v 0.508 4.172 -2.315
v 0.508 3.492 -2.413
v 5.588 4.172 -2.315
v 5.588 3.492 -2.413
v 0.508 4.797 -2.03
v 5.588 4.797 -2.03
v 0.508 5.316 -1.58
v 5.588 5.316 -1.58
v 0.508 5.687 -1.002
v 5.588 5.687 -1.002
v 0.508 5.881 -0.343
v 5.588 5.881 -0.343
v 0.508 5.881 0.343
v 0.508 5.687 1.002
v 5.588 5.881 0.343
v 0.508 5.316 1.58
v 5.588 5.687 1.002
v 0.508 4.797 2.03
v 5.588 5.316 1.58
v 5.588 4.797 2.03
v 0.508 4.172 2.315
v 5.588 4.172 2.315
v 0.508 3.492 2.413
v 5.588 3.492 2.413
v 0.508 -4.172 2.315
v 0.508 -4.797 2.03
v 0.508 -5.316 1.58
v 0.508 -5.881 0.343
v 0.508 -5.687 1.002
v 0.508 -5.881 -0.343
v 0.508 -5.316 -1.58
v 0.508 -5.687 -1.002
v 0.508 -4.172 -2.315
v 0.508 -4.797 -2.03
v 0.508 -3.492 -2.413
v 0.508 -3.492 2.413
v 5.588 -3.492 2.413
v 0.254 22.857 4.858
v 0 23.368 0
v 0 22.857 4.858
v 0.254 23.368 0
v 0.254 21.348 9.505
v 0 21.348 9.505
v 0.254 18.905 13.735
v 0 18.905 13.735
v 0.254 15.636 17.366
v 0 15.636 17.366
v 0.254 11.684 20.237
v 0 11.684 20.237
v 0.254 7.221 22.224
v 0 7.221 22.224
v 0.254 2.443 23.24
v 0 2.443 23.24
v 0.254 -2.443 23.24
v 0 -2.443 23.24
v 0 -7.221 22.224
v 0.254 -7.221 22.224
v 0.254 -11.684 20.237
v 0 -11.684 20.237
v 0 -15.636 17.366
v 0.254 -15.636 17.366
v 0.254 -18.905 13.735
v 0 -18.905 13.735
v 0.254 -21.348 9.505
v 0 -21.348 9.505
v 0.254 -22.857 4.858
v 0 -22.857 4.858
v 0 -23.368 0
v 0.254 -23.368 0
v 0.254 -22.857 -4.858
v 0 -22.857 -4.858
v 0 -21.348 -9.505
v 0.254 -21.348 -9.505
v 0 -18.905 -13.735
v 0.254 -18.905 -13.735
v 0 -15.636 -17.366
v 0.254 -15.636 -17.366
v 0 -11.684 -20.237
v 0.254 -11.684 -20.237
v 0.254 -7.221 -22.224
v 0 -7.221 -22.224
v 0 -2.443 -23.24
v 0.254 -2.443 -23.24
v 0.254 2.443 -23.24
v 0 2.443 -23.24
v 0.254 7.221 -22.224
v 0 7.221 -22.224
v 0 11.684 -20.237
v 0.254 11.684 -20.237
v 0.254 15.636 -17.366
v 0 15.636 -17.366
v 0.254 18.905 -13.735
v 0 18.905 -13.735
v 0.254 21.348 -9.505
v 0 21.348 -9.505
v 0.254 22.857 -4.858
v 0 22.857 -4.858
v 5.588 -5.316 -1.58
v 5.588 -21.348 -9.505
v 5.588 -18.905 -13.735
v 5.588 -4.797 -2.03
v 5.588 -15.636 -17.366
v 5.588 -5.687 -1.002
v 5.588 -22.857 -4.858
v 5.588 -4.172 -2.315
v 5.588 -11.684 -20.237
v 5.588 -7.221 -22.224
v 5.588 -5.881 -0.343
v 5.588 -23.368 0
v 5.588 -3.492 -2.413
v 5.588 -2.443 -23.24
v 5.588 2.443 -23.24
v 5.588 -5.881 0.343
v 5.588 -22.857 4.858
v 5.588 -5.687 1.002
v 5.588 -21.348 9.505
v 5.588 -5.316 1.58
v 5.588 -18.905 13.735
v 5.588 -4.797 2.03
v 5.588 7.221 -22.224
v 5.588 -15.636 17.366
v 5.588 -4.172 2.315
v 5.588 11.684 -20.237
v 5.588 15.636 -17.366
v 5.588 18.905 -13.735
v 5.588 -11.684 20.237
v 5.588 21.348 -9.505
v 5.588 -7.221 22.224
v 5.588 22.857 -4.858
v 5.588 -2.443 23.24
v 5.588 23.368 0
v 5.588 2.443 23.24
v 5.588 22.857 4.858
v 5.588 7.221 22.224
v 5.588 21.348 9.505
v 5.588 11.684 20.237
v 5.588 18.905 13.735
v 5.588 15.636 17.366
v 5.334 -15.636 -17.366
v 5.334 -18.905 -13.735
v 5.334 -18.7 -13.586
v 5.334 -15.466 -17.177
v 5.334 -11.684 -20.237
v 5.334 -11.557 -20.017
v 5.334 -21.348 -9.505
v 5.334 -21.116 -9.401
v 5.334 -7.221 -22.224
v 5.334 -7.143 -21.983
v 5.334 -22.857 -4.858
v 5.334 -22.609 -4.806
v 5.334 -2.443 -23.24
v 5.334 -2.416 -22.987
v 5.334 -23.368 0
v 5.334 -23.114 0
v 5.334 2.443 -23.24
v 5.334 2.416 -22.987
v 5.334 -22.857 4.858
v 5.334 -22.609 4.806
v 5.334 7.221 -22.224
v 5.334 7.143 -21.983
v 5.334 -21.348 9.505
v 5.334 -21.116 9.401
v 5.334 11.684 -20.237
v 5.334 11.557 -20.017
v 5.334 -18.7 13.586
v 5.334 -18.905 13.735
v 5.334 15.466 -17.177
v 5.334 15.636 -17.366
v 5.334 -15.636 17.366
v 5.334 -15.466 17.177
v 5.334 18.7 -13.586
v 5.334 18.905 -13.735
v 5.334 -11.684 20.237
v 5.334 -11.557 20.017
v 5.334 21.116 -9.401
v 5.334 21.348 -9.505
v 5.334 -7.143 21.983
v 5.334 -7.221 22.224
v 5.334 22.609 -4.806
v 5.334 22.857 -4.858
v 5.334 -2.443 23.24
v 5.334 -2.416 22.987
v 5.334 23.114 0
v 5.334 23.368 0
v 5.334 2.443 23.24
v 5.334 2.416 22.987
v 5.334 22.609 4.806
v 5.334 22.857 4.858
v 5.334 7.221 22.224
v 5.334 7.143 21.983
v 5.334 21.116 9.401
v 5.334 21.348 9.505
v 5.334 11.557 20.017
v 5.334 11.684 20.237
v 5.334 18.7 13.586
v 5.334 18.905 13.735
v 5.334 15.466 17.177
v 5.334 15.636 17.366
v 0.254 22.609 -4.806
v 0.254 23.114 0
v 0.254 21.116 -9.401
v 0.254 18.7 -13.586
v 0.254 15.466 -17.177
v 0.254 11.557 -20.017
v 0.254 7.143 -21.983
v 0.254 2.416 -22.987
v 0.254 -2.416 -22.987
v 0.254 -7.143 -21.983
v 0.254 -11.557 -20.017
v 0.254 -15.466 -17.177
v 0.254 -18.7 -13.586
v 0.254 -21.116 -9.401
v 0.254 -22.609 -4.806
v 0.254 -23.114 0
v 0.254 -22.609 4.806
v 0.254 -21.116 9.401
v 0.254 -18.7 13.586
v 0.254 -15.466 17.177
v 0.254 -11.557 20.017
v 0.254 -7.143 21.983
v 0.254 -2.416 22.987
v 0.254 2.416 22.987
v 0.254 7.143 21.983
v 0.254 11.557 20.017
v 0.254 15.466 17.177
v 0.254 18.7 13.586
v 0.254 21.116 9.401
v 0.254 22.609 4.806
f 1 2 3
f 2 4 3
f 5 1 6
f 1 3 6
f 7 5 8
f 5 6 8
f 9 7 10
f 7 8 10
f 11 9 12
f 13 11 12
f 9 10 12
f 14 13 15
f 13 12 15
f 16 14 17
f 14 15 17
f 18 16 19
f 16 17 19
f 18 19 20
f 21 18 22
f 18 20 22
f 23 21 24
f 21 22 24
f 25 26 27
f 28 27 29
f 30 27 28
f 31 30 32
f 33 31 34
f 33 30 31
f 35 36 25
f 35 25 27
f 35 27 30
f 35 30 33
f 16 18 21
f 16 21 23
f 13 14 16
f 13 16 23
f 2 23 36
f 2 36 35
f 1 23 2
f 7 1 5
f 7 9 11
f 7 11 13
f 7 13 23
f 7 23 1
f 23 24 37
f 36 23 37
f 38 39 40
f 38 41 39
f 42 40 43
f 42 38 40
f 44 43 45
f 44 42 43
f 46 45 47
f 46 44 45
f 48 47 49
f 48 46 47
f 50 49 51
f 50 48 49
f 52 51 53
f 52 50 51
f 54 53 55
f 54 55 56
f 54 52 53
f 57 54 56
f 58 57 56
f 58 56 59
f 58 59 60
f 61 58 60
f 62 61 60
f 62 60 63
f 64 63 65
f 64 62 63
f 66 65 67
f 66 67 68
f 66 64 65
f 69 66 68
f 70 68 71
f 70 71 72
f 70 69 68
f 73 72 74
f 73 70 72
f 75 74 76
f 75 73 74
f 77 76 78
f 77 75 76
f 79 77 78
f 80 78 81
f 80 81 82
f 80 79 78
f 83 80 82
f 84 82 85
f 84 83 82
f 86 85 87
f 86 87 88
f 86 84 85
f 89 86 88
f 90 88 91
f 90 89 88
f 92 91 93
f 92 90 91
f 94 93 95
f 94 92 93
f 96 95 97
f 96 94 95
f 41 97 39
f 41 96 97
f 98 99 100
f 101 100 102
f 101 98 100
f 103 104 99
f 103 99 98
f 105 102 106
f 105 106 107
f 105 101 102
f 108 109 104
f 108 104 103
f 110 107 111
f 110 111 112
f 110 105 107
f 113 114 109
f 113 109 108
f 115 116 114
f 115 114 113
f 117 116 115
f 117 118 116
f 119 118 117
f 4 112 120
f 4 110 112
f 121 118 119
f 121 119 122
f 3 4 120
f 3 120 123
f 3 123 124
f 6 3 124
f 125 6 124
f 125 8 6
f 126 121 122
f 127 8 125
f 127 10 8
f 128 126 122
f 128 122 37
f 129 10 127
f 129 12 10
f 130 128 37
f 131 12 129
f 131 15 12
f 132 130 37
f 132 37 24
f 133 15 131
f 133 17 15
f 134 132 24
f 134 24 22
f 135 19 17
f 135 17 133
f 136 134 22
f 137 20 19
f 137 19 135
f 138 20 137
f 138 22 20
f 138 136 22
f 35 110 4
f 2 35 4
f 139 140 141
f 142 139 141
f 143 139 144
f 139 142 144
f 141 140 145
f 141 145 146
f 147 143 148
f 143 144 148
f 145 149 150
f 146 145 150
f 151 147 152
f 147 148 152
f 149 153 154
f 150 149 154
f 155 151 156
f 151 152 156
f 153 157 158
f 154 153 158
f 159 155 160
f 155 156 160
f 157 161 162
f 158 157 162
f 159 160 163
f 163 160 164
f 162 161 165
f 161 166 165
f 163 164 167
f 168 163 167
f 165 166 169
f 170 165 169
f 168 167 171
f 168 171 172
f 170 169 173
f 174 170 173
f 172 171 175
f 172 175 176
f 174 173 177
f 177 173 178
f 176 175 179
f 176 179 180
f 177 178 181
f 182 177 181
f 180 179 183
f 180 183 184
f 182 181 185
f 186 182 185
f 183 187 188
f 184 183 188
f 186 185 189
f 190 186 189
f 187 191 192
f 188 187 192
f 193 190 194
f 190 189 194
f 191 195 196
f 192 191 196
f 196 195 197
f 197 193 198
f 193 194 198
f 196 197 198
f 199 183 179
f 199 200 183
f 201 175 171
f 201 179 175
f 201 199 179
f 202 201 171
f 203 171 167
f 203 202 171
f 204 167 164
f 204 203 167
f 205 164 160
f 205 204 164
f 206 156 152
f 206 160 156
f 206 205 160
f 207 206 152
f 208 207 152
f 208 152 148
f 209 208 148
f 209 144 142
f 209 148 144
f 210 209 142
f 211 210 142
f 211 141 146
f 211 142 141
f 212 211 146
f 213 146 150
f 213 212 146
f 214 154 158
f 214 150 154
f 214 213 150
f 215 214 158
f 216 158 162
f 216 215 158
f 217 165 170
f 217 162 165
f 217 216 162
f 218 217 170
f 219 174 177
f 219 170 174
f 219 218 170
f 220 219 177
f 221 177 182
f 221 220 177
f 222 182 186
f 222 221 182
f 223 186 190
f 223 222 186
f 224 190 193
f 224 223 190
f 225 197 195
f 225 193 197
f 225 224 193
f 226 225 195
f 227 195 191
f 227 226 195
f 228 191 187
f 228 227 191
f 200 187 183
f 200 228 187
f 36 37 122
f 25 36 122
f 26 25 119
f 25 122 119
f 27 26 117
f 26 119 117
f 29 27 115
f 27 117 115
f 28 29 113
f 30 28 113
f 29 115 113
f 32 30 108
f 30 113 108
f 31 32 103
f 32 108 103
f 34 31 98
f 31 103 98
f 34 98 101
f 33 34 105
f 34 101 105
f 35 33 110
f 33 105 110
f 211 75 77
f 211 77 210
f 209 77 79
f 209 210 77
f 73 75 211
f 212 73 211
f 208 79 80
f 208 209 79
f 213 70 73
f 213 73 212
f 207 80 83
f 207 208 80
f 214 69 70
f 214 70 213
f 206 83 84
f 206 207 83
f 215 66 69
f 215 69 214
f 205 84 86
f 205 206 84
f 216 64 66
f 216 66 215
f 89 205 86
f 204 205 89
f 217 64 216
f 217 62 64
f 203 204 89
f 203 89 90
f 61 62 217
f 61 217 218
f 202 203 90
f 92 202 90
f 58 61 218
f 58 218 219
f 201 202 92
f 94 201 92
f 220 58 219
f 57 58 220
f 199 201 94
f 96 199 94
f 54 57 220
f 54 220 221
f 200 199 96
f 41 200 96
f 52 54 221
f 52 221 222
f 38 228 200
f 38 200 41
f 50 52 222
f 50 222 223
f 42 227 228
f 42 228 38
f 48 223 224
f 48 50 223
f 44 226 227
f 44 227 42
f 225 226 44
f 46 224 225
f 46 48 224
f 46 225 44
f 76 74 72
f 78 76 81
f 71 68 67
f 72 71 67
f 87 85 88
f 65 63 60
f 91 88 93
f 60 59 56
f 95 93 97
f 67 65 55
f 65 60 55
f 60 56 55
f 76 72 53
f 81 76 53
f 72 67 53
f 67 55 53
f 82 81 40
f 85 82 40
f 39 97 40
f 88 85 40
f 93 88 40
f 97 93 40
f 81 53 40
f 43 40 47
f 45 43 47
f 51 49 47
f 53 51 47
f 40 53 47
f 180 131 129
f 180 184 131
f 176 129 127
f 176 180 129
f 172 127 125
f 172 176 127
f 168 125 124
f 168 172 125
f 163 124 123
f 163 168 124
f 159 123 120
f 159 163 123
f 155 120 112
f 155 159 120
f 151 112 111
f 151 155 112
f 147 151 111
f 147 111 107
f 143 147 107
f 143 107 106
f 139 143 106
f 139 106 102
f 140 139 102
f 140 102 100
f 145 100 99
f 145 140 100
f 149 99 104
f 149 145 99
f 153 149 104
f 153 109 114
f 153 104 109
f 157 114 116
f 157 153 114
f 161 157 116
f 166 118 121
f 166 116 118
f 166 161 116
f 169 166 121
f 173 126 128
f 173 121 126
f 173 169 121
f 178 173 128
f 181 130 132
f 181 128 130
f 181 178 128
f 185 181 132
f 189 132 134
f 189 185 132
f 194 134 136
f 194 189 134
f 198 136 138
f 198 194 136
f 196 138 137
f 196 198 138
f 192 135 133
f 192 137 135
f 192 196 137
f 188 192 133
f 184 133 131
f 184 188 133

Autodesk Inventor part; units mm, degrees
ref_plane "YZ Plane" through (0, 0, 0) normal (1, 0, 0) x (0, 1, 0)
ref_plane "XZ Plane" through (0, 0, 0) normal (0, 1, 0) x (-1, 0, 0)
sketch "Sketch1" plane through (0, 0, 0) normal (1, 0, 0) x (0, 1, 0)
  circle A0 centre (0, 0) radius 23.114
  dimension "d0" = 46.228
extrude "Extrusion1" add sketch "Sketch1" along normal blind 5.588
sketch "Sketch3" plane through (0, 0, 0) normal (0, 0, 1) x (1, 0, 0)
  line L0 (5.588, -23.114) -> (5.588, 23.114) projected
  line L1 (5.588, 23.114) -> (5.588, 23.368)
  line L2 (5.588, 23.368) -> (5.334, 23.368)
  line L3 (5.334, 23.368) -> (5.334, 23.114)
  line L4 (0, 23.114) -> (5.588, 23.114) projected
  line L5 (5.334, 23.114) -> (5.588, 23.114)
  line L6 (0, 0) -> (5.588, 0)
  line L7 (0, 23.114) -> (0, 23.368)
  line L8 (0, 23.368) -> (0.254, 23.368)
  line L9 (0.254, 23.368) -> (0.254, 23.114)
  line L10 (0, 23.114) -> (0.254, 23.114)
  dimension "d5" = 0.254
  dimension "d6" = 0.254
  dimension "d7" = 0.254
  dimension "d8" = 0.254
revolve "Revolution1" add sketch "Sketch3" angle 360 about axis through (0, 0, 0) along (1, 0, 0)
sketch "Sketch4" plane through (5.588, 0, 0) normal (1, 0, 0) x (0, 0, -1)
  line L0 (0, -3.4925) -> (0, 3.4925) construction
  line L1 (2.413, -3.4925) -> (2.413, 3.4925)
  line L2 (-2.413, 3.4925) -> (-2.413, -3.4925)
  arc A0 (-2.413, -3.4925) -> (2.413, -3.4925) centre (0, -3.4925) ccw
  arc A1 (2.413, 3.4925) -> (-2.413, 3.4925) centre (0, 3.4925) ccw
  point P0 (0, 0)
  dimension "d10" = 3.4925
  dimension "d11" = 4.826
extrude "Extrusion2" cut sketch "Sketch4" against normal blind 5.08
properties part number "msheehan_wheel"
